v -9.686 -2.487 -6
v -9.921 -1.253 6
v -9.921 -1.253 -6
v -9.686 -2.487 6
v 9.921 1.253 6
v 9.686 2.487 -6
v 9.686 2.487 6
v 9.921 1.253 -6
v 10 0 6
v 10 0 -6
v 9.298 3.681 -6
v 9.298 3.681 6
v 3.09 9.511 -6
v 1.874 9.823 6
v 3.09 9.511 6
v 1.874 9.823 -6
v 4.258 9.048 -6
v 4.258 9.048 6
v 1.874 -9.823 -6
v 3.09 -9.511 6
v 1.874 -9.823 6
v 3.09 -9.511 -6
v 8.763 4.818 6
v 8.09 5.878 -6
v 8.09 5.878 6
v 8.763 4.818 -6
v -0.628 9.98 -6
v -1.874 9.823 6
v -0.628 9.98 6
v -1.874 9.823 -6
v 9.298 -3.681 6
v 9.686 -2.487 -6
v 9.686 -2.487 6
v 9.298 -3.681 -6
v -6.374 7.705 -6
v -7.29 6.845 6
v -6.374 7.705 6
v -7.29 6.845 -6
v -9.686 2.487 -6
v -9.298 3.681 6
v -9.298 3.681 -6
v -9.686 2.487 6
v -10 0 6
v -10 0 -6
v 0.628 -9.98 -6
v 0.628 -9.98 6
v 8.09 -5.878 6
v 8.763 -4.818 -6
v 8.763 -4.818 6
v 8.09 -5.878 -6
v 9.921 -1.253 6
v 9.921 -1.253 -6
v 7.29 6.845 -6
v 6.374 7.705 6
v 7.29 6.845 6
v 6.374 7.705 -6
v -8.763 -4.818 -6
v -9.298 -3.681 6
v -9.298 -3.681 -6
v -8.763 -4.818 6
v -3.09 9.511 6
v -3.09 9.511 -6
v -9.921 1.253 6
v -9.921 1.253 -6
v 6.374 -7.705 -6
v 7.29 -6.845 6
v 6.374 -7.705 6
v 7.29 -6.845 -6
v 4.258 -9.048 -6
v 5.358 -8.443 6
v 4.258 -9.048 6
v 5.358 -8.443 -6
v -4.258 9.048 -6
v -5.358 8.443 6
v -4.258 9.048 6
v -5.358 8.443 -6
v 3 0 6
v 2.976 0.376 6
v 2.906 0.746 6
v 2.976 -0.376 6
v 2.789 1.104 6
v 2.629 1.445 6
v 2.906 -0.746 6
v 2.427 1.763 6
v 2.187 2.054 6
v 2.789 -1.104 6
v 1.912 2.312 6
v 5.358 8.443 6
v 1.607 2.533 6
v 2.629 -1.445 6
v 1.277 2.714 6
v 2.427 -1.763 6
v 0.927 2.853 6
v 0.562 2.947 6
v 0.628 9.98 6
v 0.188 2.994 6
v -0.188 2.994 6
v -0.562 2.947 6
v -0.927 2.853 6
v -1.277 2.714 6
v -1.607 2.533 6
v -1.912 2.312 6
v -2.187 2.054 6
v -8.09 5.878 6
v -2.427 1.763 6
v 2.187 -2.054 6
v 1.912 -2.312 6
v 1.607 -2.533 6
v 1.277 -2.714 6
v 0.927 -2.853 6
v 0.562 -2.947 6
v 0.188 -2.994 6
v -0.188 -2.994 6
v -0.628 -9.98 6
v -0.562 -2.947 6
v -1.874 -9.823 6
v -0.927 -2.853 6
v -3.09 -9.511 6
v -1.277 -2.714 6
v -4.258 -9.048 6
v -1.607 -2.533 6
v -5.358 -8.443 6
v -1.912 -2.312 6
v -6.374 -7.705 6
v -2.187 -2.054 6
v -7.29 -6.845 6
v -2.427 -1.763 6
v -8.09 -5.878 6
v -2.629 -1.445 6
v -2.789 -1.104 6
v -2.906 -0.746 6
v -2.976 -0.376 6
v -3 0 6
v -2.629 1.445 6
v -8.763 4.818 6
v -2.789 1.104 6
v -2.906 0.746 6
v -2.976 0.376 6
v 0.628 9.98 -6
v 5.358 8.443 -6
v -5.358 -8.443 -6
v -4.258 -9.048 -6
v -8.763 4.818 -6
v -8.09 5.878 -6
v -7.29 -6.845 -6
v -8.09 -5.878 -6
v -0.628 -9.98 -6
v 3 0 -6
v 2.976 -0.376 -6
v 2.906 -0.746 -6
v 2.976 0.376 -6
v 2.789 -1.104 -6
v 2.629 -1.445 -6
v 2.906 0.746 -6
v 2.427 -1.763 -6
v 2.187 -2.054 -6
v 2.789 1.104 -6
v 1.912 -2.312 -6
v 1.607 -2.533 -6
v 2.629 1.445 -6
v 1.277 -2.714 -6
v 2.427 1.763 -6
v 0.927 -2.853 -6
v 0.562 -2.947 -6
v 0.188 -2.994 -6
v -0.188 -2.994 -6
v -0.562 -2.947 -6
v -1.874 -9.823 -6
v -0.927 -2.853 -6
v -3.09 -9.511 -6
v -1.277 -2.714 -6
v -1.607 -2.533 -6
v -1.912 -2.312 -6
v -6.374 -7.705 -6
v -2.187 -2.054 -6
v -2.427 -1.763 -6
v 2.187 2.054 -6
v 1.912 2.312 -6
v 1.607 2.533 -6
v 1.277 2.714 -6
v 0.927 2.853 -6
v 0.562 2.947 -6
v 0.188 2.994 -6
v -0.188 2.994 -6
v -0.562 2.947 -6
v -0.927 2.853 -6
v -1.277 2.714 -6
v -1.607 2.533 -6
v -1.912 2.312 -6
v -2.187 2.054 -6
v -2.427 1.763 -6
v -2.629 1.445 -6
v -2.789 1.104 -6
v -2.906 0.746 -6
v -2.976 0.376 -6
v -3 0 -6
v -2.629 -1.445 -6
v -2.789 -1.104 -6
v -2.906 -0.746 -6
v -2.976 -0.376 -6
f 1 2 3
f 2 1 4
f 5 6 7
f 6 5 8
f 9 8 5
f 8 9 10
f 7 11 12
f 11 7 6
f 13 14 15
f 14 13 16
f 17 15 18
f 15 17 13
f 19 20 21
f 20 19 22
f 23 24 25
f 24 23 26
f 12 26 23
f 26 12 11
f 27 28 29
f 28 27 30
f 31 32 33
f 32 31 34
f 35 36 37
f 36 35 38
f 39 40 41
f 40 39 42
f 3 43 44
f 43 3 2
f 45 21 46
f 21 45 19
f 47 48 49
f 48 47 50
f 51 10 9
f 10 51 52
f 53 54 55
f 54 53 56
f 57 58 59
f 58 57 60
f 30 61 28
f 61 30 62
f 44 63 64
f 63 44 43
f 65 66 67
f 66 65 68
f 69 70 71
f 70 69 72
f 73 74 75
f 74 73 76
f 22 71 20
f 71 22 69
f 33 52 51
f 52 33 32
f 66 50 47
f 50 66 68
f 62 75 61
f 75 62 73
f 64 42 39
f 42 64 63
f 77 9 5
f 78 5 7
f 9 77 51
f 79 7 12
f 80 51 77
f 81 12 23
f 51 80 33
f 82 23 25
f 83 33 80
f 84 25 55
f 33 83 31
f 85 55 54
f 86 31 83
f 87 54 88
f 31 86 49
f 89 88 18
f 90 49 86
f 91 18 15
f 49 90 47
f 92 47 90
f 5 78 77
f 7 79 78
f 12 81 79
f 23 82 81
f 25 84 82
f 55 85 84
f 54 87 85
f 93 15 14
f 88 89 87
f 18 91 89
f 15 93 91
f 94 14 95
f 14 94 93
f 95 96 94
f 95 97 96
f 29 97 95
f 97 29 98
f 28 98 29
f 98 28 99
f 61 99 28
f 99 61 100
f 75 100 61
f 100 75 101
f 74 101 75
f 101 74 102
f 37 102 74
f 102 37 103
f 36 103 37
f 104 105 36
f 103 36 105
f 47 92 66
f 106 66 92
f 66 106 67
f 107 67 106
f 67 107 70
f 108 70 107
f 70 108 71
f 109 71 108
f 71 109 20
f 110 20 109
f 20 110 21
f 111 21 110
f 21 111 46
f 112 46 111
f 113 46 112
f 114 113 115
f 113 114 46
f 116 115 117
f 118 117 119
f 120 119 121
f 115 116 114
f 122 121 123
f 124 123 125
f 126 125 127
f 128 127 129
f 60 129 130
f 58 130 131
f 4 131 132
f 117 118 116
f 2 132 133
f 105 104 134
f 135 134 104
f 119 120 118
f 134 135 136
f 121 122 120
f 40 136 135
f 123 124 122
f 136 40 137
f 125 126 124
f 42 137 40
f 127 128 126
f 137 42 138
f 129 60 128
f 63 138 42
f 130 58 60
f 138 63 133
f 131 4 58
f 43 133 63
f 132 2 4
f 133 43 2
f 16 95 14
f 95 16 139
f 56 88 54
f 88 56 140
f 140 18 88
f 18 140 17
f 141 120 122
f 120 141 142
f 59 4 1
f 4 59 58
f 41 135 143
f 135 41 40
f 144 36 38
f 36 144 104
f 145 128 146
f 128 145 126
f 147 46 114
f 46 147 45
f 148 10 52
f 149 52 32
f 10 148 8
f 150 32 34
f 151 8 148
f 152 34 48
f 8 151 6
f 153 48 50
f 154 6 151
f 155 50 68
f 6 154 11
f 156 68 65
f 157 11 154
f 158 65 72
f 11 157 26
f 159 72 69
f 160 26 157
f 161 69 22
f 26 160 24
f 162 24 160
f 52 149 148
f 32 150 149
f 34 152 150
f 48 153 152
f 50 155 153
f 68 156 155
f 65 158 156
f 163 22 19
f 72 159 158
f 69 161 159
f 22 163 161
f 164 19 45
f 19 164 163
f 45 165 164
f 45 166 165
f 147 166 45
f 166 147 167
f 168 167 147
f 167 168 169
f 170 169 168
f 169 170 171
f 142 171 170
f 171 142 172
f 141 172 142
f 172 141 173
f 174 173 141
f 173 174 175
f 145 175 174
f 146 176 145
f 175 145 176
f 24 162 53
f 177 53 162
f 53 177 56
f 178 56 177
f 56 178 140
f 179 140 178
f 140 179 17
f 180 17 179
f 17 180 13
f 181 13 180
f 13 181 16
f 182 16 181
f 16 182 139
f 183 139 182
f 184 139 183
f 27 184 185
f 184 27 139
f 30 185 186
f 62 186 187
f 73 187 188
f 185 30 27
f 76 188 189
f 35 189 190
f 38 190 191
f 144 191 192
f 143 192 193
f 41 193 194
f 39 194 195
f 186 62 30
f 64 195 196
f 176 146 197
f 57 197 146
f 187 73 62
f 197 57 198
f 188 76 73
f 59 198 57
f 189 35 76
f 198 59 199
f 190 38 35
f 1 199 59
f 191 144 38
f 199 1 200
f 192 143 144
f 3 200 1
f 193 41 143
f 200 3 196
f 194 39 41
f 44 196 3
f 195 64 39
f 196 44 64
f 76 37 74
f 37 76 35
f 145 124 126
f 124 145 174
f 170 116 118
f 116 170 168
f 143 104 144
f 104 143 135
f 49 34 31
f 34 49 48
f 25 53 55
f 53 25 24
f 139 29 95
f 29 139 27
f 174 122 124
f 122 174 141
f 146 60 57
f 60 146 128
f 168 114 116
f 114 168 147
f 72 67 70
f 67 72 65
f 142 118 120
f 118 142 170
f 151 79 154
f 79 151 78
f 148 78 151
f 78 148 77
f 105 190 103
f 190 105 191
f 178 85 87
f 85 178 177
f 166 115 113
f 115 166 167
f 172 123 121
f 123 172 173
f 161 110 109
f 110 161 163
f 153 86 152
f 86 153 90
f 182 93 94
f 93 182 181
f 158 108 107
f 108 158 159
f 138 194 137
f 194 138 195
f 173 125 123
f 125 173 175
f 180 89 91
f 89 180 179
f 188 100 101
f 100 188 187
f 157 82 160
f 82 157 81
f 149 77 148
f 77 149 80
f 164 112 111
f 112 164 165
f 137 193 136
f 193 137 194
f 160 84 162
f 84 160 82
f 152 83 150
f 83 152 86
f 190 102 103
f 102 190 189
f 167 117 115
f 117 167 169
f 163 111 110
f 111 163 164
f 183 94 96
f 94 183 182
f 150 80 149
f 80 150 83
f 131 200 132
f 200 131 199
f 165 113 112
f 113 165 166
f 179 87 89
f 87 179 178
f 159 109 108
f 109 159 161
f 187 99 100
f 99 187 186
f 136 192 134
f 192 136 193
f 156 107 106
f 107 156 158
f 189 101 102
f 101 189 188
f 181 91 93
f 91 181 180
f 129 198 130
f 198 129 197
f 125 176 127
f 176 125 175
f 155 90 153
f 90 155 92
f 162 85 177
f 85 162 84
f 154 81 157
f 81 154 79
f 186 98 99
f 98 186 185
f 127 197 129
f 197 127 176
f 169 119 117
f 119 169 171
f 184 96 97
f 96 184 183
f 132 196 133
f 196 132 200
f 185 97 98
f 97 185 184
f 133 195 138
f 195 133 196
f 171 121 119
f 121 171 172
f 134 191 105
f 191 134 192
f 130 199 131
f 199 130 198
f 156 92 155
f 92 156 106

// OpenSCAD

// height in mm
height = 12;

// inner diameter in mm
inner_diameter = 6;

// outer diameter in mm
outer_diameter = 20;

/* [Hidden] */

inner_radius = inner_diameter/2;
outer_radius = outer_diameter/2;

$fn = 50;

difference() 
{
	cylinder(h=height, r=outer_radius, center=true);
	cylinder(h=height+1, r=inner_radius, center=true);
}



